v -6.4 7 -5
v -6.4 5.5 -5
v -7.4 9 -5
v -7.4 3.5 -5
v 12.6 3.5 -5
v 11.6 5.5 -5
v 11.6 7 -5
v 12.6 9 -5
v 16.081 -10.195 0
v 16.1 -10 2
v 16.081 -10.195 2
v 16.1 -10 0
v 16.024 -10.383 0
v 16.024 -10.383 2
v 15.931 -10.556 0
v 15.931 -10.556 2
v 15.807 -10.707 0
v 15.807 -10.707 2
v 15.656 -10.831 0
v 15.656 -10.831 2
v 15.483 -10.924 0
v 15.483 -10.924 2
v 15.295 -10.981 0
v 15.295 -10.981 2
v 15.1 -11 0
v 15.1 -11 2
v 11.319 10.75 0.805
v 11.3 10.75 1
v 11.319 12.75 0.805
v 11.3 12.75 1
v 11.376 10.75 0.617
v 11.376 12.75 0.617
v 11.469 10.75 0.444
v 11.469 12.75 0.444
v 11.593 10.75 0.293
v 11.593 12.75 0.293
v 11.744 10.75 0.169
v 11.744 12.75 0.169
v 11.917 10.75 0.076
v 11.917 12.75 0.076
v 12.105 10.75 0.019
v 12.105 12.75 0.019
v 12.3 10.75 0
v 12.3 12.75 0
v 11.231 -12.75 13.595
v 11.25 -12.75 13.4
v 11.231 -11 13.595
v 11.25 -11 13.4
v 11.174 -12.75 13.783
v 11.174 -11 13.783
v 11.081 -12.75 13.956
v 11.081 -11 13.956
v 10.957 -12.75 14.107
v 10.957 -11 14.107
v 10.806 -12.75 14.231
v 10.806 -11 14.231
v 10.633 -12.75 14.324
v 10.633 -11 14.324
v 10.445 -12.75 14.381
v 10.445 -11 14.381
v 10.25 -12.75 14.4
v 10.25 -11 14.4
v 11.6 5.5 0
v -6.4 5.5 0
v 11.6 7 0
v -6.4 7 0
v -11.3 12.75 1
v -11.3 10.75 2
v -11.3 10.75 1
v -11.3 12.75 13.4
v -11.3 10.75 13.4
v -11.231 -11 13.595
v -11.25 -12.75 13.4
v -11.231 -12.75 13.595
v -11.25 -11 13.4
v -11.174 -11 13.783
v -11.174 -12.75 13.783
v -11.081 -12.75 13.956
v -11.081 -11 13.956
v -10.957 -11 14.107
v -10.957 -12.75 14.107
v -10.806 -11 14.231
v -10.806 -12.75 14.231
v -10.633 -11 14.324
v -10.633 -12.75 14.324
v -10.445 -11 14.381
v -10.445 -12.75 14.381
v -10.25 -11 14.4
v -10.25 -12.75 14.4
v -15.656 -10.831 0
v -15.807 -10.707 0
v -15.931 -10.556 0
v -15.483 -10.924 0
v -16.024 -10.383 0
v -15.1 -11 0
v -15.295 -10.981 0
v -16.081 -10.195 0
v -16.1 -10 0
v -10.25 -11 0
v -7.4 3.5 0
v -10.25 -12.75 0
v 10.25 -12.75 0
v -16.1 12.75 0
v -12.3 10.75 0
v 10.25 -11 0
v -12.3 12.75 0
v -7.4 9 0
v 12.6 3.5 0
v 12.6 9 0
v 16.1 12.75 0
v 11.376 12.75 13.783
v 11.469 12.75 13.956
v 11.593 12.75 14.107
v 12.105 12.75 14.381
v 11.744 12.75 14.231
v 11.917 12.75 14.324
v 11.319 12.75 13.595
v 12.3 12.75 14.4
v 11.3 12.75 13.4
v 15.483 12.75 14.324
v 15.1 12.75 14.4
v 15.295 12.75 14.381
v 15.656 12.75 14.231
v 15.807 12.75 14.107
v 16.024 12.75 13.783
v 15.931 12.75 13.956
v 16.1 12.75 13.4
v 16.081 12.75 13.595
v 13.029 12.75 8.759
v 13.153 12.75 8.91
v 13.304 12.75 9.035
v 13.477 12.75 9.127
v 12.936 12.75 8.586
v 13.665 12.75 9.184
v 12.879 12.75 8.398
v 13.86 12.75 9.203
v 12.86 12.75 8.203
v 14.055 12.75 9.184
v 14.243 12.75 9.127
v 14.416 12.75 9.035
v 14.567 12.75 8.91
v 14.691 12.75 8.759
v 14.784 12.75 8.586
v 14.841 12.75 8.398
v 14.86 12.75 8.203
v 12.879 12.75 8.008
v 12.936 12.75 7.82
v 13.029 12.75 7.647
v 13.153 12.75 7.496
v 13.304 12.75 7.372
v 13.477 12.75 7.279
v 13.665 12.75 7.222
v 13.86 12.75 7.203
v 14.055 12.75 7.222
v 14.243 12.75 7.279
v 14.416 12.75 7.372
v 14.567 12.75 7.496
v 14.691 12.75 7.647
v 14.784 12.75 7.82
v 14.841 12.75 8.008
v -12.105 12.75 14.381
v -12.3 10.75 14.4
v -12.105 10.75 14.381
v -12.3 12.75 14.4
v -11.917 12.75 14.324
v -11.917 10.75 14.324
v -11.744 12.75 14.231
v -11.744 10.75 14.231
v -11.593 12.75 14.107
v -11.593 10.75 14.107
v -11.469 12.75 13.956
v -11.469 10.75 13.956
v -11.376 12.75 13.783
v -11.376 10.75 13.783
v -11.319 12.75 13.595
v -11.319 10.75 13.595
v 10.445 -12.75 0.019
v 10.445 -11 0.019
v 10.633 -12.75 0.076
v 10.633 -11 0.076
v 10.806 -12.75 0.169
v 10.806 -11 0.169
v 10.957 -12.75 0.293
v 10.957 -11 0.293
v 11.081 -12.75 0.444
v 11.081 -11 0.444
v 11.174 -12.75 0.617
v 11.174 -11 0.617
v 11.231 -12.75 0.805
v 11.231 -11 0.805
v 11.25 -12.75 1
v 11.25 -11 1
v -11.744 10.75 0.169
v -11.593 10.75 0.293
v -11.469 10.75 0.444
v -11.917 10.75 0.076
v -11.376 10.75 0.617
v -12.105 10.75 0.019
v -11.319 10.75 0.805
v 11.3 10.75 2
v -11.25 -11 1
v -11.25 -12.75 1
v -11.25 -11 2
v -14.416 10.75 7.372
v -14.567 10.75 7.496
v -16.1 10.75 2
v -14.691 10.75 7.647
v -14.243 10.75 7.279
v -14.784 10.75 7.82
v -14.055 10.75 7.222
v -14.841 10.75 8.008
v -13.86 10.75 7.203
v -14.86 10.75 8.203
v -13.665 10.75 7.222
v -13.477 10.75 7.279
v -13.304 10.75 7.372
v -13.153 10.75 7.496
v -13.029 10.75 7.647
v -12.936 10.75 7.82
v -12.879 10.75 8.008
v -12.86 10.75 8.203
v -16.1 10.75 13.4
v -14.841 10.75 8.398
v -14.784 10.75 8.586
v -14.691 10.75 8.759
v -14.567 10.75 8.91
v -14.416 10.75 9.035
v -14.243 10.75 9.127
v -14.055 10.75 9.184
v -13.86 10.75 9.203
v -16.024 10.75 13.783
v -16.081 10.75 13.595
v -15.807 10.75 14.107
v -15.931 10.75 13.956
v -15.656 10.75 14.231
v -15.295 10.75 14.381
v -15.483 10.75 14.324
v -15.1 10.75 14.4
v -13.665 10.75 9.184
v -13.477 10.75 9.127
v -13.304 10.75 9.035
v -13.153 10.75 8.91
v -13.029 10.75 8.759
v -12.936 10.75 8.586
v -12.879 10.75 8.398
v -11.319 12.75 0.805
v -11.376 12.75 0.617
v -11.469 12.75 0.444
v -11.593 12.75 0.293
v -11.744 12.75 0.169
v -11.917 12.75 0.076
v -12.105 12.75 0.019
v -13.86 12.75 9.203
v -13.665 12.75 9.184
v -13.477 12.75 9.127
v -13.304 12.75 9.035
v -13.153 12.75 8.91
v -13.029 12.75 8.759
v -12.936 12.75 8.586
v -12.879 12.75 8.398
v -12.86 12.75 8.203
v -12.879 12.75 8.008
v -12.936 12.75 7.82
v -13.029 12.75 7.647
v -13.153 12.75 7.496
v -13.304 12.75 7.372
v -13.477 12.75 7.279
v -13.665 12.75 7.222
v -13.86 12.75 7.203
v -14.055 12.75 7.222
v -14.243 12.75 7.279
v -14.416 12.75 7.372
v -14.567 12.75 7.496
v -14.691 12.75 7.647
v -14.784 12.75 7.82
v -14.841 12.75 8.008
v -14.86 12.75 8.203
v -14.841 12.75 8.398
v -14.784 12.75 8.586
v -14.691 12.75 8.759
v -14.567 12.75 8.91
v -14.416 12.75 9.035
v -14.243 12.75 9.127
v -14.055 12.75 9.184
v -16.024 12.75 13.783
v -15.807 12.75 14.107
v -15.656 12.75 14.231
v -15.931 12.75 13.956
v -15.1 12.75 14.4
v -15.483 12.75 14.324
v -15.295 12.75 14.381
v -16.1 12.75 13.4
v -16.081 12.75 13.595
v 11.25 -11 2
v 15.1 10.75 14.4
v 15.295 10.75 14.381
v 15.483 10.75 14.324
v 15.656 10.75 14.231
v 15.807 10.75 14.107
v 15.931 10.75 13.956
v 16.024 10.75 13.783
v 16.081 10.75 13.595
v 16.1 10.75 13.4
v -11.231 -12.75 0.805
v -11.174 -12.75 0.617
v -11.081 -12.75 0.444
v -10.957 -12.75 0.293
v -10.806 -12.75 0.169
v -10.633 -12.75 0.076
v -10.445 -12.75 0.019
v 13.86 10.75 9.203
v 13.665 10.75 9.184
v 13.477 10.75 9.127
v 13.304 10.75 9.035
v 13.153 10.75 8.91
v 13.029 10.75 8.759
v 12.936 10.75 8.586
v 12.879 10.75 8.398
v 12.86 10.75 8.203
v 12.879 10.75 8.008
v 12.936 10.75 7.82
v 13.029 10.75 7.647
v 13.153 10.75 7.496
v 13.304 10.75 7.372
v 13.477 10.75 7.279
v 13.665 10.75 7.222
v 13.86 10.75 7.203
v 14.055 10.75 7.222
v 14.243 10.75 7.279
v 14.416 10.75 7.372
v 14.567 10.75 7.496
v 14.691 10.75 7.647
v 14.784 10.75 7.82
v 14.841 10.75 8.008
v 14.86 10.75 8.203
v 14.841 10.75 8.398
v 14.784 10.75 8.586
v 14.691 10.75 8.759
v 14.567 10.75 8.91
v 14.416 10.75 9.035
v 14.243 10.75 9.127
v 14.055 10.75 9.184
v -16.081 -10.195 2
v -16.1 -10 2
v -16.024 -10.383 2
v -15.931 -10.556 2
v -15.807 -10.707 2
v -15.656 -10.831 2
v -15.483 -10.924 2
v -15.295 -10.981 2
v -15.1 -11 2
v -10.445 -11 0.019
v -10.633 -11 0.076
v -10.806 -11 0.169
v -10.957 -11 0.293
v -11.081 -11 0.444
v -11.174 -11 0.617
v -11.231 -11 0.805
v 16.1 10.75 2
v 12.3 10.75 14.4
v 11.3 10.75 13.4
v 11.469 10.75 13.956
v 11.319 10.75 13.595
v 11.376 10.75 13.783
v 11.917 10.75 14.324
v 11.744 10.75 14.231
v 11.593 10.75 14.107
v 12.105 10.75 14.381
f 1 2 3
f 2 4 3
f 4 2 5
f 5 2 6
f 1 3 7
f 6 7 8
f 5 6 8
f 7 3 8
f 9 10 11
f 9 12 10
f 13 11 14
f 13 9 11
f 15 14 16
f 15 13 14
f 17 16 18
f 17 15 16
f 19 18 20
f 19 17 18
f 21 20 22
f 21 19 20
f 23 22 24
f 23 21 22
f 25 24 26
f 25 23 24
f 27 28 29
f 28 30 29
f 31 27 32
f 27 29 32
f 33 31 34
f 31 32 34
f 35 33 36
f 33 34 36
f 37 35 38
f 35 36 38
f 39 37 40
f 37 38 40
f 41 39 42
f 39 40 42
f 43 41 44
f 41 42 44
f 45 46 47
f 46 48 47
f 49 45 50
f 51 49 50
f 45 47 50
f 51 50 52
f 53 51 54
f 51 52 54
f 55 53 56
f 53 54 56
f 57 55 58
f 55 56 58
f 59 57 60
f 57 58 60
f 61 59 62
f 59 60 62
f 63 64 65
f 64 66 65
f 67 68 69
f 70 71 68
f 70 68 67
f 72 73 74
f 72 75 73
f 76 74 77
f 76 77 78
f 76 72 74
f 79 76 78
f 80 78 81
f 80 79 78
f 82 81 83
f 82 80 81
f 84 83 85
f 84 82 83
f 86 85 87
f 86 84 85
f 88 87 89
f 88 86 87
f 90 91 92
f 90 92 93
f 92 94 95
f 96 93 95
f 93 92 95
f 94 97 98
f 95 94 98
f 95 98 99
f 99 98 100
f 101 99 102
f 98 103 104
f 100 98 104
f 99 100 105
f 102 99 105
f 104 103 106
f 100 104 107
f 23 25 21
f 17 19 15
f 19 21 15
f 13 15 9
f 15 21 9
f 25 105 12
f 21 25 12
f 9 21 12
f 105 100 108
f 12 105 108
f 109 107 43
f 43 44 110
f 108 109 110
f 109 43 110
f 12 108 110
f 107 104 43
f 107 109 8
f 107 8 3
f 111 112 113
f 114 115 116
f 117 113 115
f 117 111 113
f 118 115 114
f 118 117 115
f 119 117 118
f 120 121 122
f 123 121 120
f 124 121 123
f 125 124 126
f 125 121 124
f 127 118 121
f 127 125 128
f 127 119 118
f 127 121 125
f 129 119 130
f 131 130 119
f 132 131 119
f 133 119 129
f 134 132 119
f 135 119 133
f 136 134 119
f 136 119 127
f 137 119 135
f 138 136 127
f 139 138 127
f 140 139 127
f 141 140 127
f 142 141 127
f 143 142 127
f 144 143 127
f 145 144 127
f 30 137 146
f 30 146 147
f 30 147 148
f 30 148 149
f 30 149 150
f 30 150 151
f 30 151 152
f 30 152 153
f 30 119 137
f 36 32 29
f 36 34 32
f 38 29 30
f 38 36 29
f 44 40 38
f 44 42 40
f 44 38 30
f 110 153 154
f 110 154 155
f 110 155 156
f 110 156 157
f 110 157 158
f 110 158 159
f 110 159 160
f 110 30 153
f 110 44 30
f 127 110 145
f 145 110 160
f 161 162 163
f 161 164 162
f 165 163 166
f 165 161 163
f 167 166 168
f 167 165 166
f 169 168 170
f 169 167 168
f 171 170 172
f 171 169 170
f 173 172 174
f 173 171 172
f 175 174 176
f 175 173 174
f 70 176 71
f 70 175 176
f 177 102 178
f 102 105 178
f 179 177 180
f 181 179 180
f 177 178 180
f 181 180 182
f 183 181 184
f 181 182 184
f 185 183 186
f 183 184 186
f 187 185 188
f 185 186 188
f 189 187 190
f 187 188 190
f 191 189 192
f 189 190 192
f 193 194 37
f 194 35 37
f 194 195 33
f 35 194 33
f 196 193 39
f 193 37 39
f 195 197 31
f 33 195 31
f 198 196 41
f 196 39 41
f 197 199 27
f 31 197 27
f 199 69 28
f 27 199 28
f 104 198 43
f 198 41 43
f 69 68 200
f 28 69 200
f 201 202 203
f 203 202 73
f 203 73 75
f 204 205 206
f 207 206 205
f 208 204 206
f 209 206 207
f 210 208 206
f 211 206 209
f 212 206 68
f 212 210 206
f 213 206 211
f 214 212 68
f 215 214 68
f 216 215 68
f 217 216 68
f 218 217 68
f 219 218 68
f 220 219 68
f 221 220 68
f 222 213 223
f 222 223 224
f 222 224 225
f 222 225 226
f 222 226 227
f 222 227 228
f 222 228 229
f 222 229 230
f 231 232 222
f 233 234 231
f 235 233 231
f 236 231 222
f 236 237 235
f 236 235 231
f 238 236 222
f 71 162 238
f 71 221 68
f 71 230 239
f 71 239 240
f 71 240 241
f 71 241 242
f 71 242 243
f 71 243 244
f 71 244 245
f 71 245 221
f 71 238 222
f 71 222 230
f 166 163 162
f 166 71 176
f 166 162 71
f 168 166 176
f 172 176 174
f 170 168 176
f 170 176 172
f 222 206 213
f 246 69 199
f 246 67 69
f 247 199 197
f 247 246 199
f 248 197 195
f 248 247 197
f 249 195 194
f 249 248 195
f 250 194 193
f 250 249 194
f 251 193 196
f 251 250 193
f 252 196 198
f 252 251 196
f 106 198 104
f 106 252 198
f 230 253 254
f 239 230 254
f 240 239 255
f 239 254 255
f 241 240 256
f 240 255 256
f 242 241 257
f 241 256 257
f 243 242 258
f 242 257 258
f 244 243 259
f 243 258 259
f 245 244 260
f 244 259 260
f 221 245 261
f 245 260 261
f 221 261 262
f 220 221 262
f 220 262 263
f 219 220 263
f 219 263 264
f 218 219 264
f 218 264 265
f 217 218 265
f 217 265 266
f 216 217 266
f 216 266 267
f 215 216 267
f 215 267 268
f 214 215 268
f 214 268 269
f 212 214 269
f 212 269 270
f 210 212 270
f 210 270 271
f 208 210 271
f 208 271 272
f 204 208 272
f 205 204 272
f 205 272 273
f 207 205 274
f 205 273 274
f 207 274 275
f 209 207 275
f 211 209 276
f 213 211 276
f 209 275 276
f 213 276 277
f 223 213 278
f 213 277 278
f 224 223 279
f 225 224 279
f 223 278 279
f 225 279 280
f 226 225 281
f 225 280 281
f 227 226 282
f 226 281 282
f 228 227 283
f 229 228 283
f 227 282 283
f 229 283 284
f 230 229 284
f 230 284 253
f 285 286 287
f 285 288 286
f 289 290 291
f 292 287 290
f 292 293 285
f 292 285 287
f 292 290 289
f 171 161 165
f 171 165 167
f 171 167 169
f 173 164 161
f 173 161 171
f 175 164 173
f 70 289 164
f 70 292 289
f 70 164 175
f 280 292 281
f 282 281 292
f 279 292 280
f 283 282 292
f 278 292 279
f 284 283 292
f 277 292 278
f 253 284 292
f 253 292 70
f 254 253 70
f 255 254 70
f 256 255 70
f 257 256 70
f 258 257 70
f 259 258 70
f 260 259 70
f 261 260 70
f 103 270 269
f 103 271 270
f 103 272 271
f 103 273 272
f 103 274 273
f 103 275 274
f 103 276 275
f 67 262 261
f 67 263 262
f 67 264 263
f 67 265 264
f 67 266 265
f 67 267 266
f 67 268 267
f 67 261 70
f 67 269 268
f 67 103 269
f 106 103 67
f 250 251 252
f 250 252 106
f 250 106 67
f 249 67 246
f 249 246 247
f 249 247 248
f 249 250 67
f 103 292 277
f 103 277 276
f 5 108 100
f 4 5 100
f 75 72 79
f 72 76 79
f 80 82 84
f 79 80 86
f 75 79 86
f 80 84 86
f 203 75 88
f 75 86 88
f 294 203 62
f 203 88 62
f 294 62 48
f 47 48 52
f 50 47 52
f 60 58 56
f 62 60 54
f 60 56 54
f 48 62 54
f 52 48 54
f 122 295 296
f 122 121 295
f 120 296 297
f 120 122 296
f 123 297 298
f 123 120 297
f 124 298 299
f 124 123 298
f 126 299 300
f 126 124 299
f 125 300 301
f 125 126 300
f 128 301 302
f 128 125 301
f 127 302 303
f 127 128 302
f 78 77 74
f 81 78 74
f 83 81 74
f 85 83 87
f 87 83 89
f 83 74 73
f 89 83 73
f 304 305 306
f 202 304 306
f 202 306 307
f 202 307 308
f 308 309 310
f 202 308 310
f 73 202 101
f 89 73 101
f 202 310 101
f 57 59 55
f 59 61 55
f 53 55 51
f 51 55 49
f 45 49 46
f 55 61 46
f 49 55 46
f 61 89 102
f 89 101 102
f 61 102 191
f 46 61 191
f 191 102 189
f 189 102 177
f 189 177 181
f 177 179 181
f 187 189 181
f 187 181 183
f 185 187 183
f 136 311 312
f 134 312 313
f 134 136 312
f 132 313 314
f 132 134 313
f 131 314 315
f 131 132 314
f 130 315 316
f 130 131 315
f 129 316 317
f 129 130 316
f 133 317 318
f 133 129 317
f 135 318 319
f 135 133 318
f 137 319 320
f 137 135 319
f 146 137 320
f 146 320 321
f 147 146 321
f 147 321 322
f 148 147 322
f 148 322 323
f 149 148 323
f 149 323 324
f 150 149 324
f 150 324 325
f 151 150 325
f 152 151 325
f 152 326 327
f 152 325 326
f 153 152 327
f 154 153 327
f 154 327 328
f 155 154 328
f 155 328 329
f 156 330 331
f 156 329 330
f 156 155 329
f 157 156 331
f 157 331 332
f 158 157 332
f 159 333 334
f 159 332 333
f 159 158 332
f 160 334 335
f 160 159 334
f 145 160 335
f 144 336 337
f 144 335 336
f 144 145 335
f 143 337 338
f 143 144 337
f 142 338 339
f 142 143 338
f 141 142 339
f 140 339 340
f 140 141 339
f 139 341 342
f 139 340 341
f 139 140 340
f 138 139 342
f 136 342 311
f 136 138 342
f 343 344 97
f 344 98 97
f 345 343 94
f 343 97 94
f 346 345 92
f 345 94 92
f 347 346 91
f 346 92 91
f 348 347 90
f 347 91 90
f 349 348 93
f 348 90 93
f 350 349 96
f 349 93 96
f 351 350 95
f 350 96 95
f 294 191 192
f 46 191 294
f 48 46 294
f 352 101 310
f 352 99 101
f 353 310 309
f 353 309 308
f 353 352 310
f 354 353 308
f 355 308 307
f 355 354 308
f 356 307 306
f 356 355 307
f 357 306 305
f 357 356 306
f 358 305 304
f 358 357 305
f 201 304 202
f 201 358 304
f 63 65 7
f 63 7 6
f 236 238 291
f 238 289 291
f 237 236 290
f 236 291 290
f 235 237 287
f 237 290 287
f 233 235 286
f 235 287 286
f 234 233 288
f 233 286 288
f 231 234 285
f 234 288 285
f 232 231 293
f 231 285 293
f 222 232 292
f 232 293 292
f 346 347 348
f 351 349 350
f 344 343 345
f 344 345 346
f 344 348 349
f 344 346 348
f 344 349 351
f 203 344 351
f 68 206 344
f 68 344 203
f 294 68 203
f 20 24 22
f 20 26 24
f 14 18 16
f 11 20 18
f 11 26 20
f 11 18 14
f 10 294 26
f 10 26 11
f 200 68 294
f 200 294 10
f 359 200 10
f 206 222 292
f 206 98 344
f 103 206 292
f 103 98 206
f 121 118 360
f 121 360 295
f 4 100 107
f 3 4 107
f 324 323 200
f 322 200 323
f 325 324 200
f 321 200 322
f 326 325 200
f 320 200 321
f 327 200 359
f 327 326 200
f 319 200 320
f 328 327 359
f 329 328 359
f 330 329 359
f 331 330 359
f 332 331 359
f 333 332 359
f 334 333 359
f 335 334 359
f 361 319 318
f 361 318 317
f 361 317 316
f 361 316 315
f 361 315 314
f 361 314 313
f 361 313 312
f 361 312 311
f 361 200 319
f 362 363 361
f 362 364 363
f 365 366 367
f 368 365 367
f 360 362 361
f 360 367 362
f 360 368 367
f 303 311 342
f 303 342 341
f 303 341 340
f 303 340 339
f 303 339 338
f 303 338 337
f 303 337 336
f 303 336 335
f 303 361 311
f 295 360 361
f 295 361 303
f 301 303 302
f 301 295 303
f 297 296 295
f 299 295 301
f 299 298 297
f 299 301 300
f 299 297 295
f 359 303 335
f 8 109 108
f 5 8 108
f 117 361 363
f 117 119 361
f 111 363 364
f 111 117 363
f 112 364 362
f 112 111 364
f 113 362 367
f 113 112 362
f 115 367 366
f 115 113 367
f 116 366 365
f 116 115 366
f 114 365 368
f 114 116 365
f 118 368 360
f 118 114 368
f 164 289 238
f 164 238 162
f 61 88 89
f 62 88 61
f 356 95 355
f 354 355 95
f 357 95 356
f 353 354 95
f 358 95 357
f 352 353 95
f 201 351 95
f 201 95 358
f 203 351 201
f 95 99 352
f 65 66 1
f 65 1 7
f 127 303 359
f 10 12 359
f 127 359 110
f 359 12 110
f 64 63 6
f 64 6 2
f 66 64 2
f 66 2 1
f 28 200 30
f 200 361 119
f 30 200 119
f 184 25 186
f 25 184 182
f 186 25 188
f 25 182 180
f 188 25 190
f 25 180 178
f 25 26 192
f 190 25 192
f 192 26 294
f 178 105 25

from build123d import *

# Parameters (mm, degrees)
SKETCH1_W           = 32.2
SKETCH1_H           = 25.5
BOSS_EXTRUDE1_DEPTH = 14.4
SKETCH3_W           = 32.2
SKETCH3_H           = 21.75
CUT_EXTRUDE1_DEPTH  = 12.4
SKETCH5_W           = 22.6
SKETCH5_H           = 2
CUT_EXTRUDE2_DEPTH  = 14.4
FILLET1_R           = 1
FILLET2_R           = 1
FILLET3_R           = 1
FILLET4_R           = 1
SKETCH10_R          = 1
CUT_EXTRUDE3_DEPTH  = 10
SKETCH11_W          = 4.85
SKETCH11_H          = 1.75
CUT_EXTRUDE4_DEPTH  = 20
FILLET5_R           = 1
FILLET6_R           = 1
SKETCH12_W          = 20
SKETCH12_H          = 2
BOSS_EXTRUDE2_DEPTH = 5
BOSS_EXTRUDE3_DEPTH = 5


with BuildPart() as part:
    # Sketch1 → Boss-Extrude1 (new body)
    with BuildSketch(Plane.XY):
        Rectangle(SKETCH1_W, SKETCH1_H)
    extrude(amount=BOSS_EXTRUDE1_DEPTH)

    # Sketch3 → Cut-Extrude1 (cut)
    with BuildSketch(Plane.XY.offset(14.4)):
        with Locations((0, -0.125)):
            Rectangle(SKETCH3_W, SKETCH3_H)
    extrude(amount=-CUT_EXTRUDE1_DEPTH, mode=Mode.SUBTRACT)

    # Sketch5 → Cut-Extrude2 (cut)
    with BuildSketch(Plane.XY.offset(14.4)):
        with Locations((0, 11.75)):
            Rectangle(SKETCH5_W, SKETCH5_H)
    extrude(amount=-CUT_EXTRUDE2_DEPTH, mode=Mode.SUBTRACT)

    # Fillet1
    fillet1_edges = [part.edges().sort_by_distance(p)[0] for p in [
        (-11.3, 11.75, 14.4),
    ]]
    fillet(fillet1_edges, radius=FILLET1_R)

    # Fillet2
    fillet2_edges = [part.edges().sort_by_distance(p)[0] for p in [
        (-16.1, 11.75, 14.4),
    ]]
    fillet(fillet2_edges, radius=FILLET2_R)

    # Fillet3
    fillet3_edges = [part.edges().sort_by_distance(p)[0] for p in [
        (11.3, 11.75, 14.4),
    ]]
    fillet(fillet3_edges, radius=FILLET3_R)

    # Fillet4
    fillet4_edges = [part.edges().sort_by_distance(p)[0] for p in [
        (16.1, 11.75, 14.4),
    ]]
    fillet(fillet4_edges, radius=FILLET4_R)

    # Sketch10 → Cut-Extrude3 (cut)
    with BuildSketch(Plane(origin=(0, 12.75, 0), x_dir=(1, 0, 0), z_dir=(0, 1, 0))):
        with Locations(Location((-13.86, -8.203047487, 0), (0, 0, 270))):
            Circle(SKETCH10_R)
    cut_extrude3 = extrude(amount=-CUT_EXTRUDE3_DEPTH, mode=Mode.SUBTRACT)

    # Mirror1: Cut-Extrude3 across plane
    add(cut_extrude3.mirror(Plane(origin=(0, 0, 0), x_dir=(0, 0, 1), z_dir=(1, 0, 0))), mode=Mode.SUBTRACT)

    # Sketch11 → Cut-Extrude4 (cut)
    with BuildSketch(Plane.XY.offset(14.4)):
        with Locations((-13.675, -11.875)):
            Rectangle(SKETCH11_W, SKETCH11_H)
    cut_extrude4 = extrude(amount=-CUT_EXTRUDE4_DEPTH, mode=Mode.SUBTRACT)

    # Mirror2: Cut-Extrude4 across plane
    add(cut_extrude4.mirror(Plane(origin=(0, 0, 0), x_dir=(0, 0, 1), z_dir=(1, 0, 0))), mode=Mode.SUBTRACT)

    # Fillet5
    fillet5_edges = [part.edges().sort_by_distance(p)[0] for p in [
        (16.1, -11, 1),
        (11.25, -11.875, 14.4),
        (11.25, -11.875, 0),
        (-11.25, -11.875, 0),
        (-16.1, -11, 1),
        (-11.25, -11.875, 14.4),
    ]]
    fillet(fillet5_edges, radius=FILLET5_R)

    # Fillet6
    fillet6_edges = [part.edges().sort_by_distance(p)[0] for p in [
        (-11.3, 11.75, 0),
        (11.3, 11.75, 0),
    ]]
    fillet(fillet6_edges, radius=FILLET6_R)

    # Sketch12 → Boss-Extrude2 (add)
    with BuildSketch(Plane(origin=(0, 0, 0), x_dir=(-1, 0, 0), z_dir=(0, 0, -1))):
        with Locations((-2.6, 4.5)):
            Rectangle(SKETCH12_W, SKETCH12_H)
    extrude(amount=BOSS_EXTRUDE2_DEPTH)

    # Sketch13 → Boss-Extrude3 (add)
    with BuildSketch(Plane(origin=(0, 0, 0), x_dir=(-1, 0, 0), z_dir=(0, 0, -1))):
        Polygon((-12.6, 9), (7.4, 9), (7.4, 7), (7.4, 5.5), (6.4, 5.5), (6.4, 7), (-11.6, 7), (-11.6, 5.5), (-12.6, 5.5), (-12.6, 7), align=None)
    extrude(amount=BOSS_EXTRUDE3_DEPTH)


solid = part.part
